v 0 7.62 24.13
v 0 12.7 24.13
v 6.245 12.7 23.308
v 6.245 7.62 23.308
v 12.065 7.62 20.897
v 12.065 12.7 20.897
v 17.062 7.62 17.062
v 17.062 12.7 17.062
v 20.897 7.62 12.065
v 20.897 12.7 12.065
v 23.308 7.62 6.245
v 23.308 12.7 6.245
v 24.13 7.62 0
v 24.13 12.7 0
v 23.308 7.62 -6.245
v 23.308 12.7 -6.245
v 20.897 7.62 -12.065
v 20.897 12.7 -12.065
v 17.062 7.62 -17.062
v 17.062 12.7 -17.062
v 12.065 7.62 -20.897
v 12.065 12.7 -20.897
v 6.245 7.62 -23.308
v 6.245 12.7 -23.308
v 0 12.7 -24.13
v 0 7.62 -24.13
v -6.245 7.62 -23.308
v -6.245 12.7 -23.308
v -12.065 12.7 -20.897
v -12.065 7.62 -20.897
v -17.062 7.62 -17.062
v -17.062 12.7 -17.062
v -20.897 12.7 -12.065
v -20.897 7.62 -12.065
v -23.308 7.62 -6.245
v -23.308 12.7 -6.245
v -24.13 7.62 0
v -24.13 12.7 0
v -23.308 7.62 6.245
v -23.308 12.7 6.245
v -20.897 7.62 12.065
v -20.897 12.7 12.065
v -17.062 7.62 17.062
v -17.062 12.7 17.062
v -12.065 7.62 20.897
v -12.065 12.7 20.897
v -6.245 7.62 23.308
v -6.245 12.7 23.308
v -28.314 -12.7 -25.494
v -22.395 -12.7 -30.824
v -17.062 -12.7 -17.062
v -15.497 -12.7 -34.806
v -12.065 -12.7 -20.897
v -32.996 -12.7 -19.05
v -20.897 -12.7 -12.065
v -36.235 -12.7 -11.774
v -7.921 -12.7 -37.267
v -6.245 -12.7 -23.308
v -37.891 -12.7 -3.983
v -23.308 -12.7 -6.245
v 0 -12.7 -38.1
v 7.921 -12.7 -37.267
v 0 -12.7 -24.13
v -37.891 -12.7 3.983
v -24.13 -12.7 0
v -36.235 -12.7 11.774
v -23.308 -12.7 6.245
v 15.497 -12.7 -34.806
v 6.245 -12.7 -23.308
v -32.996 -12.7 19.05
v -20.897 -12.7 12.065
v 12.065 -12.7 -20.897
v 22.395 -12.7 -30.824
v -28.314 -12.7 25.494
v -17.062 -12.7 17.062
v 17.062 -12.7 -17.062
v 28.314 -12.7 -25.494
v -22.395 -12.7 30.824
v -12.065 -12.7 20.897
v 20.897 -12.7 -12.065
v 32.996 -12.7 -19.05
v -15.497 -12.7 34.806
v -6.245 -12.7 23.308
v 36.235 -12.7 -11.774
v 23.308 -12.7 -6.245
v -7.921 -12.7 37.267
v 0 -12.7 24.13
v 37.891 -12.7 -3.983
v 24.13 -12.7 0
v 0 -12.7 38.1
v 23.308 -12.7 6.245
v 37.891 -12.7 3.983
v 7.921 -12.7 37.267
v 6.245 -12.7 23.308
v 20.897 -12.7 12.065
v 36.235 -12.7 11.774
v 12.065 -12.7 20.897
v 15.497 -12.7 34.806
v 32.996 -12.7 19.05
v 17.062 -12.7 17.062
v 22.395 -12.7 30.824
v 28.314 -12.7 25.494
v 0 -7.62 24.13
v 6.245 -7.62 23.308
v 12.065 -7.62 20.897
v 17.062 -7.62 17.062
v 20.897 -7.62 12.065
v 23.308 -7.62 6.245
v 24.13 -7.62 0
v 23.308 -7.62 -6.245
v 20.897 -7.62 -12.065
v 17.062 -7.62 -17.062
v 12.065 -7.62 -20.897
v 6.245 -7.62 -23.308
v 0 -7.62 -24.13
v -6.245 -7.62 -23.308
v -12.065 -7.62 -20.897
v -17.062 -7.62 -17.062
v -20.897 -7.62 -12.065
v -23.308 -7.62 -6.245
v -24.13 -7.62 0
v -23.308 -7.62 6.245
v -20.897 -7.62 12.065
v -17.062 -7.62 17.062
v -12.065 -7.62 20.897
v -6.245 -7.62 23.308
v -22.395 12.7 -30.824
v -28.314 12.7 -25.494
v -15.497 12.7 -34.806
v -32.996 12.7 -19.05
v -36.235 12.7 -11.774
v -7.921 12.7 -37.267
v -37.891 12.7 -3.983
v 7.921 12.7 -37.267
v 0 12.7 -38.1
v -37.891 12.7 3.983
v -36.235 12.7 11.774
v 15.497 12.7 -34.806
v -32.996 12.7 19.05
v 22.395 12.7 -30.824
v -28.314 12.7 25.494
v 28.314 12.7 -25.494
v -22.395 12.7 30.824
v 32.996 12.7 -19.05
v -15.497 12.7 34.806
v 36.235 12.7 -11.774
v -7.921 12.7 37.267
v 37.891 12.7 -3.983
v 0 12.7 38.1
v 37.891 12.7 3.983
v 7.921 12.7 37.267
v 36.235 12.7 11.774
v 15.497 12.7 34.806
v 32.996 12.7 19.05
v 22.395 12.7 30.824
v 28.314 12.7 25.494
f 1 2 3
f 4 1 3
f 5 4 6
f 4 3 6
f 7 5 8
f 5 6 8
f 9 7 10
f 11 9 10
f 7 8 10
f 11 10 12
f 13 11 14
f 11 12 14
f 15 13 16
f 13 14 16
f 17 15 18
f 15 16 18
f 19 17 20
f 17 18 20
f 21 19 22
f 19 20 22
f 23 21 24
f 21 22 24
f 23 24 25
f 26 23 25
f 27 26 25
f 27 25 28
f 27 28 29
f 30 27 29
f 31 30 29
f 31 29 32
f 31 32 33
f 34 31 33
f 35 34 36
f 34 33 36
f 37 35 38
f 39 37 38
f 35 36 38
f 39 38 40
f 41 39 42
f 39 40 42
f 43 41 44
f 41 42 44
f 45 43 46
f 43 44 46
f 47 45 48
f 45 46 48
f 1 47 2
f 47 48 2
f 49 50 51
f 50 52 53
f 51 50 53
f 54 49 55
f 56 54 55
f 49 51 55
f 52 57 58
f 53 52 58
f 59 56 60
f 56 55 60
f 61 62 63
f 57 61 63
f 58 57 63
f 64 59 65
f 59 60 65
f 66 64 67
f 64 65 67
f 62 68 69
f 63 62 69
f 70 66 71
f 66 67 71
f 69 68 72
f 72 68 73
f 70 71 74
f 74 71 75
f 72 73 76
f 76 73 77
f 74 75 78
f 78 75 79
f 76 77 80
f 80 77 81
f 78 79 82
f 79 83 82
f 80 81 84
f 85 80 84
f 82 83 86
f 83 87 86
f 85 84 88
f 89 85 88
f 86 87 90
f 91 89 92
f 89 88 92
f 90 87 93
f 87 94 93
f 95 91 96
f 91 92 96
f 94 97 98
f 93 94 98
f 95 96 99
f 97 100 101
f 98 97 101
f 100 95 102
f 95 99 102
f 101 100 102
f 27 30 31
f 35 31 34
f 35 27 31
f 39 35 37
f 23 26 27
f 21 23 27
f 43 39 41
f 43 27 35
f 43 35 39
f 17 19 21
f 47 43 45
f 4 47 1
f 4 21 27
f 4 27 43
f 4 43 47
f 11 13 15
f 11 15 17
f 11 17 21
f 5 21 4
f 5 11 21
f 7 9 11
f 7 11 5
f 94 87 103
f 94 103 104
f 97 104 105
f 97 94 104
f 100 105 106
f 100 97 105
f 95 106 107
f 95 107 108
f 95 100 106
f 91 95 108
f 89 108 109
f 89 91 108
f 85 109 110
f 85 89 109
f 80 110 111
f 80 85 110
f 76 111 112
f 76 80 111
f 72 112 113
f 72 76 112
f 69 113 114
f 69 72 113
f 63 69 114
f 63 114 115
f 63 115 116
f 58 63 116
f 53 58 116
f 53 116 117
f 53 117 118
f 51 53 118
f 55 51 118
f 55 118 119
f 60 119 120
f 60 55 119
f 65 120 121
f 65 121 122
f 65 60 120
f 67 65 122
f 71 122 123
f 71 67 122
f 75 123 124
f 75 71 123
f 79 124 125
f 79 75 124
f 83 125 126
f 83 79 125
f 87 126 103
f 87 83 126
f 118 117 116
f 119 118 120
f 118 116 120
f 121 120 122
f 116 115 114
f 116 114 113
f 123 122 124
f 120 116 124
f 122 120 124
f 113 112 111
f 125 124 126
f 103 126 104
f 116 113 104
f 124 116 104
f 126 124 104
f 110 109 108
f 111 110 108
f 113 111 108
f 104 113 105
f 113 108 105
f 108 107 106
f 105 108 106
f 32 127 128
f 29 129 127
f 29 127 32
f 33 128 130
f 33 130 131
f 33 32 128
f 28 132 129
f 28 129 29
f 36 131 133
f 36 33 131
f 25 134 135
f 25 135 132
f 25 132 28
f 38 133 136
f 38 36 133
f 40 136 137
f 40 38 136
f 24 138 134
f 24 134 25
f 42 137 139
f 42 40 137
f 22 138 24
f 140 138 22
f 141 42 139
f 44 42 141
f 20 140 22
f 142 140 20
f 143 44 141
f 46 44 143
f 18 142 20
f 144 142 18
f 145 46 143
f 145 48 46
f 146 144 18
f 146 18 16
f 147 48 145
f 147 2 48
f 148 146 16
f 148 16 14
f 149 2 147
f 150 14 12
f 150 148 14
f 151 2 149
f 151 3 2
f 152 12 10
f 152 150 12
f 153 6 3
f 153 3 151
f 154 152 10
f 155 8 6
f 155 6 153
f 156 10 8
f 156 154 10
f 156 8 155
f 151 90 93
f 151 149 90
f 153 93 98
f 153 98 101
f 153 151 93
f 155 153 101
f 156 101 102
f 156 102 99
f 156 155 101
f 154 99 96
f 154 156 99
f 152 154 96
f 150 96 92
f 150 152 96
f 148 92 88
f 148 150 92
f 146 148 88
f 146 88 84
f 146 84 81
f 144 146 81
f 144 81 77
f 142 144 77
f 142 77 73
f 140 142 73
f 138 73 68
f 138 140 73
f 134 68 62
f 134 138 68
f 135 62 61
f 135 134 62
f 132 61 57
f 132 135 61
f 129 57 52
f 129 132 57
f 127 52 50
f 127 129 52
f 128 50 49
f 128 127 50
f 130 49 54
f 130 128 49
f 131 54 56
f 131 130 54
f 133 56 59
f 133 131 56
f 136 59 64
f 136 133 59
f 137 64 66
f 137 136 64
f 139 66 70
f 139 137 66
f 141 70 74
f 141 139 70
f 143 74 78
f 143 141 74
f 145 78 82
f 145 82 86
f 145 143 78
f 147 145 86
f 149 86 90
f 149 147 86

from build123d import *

# Parameters (mm, degrees)
SKETCH1_R           = 38.1
BOSS_EXTRUDE1_DEPTH = 12.7
SKETCH2_R           = 24.13
CUT_EXTRUDE1_DEPTH  = 5.08


with BuildPart() as part:
    # Sketch1 → Boss-Extrude1 (new body)
    with BuildSketch(Plane(origin=(0, 0, 0), x_dir=(1, 0, 0), z_dir=(0, 1, 0))):
        with Locations(Location((0, 0, 0), (0, 0, 270))):
            Circle(SKETCH1_R)
    boss_extrude1 = extrude(amount=BOSS_EXTRUDE1_DEPTH)

    # Sketch2 → Cut-Extrude1 (cut)
    with BuildSketch(Plane(origin=(0, 12.7, 0), x_dir=(1, 0, 0), z_dir=(0, 1, 0))):
        with Locations(Location((0, 0, 0), (0, 0, 270))):
            Circle(SKETCH2_R)
    cut_extrude1 = extrude(amount=-CUT_EXTRUDE1_DEPTH, mode=Mode.SUBTRACT)

    # Mirror1: Boss-Extrude1, Cut-Extrude1 across plane
    add(boss_extrude1.mirror(Plane.ZX))
    add(cut_extrude1.mirror(Plane.ZX), mode=Mode.SUBTRACT)


solid = part.part
